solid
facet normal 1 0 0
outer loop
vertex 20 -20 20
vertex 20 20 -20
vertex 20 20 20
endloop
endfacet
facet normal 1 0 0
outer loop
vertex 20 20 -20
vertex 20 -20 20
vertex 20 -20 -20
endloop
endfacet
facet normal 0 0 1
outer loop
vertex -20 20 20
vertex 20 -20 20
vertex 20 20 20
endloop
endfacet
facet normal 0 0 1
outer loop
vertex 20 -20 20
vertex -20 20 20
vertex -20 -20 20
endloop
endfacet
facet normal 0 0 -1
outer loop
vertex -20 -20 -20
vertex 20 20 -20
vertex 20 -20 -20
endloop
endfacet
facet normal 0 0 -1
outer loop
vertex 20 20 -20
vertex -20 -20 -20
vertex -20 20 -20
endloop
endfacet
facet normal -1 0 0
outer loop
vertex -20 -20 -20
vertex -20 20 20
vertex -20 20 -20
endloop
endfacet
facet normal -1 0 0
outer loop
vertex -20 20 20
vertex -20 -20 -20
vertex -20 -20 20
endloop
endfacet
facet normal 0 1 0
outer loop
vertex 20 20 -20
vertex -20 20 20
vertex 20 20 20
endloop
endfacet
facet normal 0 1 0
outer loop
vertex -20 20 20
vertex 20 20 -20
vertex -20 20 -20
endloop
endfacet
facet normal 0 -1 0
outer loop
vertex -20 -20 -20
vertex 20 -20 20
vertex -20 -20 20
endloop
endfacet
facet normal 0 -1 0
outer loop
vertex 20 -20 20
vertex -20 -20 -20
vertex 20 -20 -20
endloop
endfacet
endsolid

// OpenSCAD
/*
    Author: Lonneke Kolkman
    LonnWolf.
*/

side = 40; // cube side size
engravingDepth = 3; 
scaleEngraving = 0.2;

module die(i) {
    if(i==0) {
        cube(side, center=true);
    }
    else {
        if(i%2==0) {
            difference() {
                rotate([90,0,0])die(i-1);
                engrave(i);
            }
        }
        else {
            difference() {
                rotate([0,90,0])die(i-1);
                engrave(i);
            }
        }
    }
}

module engrave(i) {
    engraveside = str("dxfSide",i,".dxf");
    translate([-0.5*side,-0.5*side,0.5*side])
    linear_extrude(height = engravingDepth, center=true)
    resize([scaleEngraving*side,scaleEngraving*side,0])
    import(engraveside);
}
die(6);
